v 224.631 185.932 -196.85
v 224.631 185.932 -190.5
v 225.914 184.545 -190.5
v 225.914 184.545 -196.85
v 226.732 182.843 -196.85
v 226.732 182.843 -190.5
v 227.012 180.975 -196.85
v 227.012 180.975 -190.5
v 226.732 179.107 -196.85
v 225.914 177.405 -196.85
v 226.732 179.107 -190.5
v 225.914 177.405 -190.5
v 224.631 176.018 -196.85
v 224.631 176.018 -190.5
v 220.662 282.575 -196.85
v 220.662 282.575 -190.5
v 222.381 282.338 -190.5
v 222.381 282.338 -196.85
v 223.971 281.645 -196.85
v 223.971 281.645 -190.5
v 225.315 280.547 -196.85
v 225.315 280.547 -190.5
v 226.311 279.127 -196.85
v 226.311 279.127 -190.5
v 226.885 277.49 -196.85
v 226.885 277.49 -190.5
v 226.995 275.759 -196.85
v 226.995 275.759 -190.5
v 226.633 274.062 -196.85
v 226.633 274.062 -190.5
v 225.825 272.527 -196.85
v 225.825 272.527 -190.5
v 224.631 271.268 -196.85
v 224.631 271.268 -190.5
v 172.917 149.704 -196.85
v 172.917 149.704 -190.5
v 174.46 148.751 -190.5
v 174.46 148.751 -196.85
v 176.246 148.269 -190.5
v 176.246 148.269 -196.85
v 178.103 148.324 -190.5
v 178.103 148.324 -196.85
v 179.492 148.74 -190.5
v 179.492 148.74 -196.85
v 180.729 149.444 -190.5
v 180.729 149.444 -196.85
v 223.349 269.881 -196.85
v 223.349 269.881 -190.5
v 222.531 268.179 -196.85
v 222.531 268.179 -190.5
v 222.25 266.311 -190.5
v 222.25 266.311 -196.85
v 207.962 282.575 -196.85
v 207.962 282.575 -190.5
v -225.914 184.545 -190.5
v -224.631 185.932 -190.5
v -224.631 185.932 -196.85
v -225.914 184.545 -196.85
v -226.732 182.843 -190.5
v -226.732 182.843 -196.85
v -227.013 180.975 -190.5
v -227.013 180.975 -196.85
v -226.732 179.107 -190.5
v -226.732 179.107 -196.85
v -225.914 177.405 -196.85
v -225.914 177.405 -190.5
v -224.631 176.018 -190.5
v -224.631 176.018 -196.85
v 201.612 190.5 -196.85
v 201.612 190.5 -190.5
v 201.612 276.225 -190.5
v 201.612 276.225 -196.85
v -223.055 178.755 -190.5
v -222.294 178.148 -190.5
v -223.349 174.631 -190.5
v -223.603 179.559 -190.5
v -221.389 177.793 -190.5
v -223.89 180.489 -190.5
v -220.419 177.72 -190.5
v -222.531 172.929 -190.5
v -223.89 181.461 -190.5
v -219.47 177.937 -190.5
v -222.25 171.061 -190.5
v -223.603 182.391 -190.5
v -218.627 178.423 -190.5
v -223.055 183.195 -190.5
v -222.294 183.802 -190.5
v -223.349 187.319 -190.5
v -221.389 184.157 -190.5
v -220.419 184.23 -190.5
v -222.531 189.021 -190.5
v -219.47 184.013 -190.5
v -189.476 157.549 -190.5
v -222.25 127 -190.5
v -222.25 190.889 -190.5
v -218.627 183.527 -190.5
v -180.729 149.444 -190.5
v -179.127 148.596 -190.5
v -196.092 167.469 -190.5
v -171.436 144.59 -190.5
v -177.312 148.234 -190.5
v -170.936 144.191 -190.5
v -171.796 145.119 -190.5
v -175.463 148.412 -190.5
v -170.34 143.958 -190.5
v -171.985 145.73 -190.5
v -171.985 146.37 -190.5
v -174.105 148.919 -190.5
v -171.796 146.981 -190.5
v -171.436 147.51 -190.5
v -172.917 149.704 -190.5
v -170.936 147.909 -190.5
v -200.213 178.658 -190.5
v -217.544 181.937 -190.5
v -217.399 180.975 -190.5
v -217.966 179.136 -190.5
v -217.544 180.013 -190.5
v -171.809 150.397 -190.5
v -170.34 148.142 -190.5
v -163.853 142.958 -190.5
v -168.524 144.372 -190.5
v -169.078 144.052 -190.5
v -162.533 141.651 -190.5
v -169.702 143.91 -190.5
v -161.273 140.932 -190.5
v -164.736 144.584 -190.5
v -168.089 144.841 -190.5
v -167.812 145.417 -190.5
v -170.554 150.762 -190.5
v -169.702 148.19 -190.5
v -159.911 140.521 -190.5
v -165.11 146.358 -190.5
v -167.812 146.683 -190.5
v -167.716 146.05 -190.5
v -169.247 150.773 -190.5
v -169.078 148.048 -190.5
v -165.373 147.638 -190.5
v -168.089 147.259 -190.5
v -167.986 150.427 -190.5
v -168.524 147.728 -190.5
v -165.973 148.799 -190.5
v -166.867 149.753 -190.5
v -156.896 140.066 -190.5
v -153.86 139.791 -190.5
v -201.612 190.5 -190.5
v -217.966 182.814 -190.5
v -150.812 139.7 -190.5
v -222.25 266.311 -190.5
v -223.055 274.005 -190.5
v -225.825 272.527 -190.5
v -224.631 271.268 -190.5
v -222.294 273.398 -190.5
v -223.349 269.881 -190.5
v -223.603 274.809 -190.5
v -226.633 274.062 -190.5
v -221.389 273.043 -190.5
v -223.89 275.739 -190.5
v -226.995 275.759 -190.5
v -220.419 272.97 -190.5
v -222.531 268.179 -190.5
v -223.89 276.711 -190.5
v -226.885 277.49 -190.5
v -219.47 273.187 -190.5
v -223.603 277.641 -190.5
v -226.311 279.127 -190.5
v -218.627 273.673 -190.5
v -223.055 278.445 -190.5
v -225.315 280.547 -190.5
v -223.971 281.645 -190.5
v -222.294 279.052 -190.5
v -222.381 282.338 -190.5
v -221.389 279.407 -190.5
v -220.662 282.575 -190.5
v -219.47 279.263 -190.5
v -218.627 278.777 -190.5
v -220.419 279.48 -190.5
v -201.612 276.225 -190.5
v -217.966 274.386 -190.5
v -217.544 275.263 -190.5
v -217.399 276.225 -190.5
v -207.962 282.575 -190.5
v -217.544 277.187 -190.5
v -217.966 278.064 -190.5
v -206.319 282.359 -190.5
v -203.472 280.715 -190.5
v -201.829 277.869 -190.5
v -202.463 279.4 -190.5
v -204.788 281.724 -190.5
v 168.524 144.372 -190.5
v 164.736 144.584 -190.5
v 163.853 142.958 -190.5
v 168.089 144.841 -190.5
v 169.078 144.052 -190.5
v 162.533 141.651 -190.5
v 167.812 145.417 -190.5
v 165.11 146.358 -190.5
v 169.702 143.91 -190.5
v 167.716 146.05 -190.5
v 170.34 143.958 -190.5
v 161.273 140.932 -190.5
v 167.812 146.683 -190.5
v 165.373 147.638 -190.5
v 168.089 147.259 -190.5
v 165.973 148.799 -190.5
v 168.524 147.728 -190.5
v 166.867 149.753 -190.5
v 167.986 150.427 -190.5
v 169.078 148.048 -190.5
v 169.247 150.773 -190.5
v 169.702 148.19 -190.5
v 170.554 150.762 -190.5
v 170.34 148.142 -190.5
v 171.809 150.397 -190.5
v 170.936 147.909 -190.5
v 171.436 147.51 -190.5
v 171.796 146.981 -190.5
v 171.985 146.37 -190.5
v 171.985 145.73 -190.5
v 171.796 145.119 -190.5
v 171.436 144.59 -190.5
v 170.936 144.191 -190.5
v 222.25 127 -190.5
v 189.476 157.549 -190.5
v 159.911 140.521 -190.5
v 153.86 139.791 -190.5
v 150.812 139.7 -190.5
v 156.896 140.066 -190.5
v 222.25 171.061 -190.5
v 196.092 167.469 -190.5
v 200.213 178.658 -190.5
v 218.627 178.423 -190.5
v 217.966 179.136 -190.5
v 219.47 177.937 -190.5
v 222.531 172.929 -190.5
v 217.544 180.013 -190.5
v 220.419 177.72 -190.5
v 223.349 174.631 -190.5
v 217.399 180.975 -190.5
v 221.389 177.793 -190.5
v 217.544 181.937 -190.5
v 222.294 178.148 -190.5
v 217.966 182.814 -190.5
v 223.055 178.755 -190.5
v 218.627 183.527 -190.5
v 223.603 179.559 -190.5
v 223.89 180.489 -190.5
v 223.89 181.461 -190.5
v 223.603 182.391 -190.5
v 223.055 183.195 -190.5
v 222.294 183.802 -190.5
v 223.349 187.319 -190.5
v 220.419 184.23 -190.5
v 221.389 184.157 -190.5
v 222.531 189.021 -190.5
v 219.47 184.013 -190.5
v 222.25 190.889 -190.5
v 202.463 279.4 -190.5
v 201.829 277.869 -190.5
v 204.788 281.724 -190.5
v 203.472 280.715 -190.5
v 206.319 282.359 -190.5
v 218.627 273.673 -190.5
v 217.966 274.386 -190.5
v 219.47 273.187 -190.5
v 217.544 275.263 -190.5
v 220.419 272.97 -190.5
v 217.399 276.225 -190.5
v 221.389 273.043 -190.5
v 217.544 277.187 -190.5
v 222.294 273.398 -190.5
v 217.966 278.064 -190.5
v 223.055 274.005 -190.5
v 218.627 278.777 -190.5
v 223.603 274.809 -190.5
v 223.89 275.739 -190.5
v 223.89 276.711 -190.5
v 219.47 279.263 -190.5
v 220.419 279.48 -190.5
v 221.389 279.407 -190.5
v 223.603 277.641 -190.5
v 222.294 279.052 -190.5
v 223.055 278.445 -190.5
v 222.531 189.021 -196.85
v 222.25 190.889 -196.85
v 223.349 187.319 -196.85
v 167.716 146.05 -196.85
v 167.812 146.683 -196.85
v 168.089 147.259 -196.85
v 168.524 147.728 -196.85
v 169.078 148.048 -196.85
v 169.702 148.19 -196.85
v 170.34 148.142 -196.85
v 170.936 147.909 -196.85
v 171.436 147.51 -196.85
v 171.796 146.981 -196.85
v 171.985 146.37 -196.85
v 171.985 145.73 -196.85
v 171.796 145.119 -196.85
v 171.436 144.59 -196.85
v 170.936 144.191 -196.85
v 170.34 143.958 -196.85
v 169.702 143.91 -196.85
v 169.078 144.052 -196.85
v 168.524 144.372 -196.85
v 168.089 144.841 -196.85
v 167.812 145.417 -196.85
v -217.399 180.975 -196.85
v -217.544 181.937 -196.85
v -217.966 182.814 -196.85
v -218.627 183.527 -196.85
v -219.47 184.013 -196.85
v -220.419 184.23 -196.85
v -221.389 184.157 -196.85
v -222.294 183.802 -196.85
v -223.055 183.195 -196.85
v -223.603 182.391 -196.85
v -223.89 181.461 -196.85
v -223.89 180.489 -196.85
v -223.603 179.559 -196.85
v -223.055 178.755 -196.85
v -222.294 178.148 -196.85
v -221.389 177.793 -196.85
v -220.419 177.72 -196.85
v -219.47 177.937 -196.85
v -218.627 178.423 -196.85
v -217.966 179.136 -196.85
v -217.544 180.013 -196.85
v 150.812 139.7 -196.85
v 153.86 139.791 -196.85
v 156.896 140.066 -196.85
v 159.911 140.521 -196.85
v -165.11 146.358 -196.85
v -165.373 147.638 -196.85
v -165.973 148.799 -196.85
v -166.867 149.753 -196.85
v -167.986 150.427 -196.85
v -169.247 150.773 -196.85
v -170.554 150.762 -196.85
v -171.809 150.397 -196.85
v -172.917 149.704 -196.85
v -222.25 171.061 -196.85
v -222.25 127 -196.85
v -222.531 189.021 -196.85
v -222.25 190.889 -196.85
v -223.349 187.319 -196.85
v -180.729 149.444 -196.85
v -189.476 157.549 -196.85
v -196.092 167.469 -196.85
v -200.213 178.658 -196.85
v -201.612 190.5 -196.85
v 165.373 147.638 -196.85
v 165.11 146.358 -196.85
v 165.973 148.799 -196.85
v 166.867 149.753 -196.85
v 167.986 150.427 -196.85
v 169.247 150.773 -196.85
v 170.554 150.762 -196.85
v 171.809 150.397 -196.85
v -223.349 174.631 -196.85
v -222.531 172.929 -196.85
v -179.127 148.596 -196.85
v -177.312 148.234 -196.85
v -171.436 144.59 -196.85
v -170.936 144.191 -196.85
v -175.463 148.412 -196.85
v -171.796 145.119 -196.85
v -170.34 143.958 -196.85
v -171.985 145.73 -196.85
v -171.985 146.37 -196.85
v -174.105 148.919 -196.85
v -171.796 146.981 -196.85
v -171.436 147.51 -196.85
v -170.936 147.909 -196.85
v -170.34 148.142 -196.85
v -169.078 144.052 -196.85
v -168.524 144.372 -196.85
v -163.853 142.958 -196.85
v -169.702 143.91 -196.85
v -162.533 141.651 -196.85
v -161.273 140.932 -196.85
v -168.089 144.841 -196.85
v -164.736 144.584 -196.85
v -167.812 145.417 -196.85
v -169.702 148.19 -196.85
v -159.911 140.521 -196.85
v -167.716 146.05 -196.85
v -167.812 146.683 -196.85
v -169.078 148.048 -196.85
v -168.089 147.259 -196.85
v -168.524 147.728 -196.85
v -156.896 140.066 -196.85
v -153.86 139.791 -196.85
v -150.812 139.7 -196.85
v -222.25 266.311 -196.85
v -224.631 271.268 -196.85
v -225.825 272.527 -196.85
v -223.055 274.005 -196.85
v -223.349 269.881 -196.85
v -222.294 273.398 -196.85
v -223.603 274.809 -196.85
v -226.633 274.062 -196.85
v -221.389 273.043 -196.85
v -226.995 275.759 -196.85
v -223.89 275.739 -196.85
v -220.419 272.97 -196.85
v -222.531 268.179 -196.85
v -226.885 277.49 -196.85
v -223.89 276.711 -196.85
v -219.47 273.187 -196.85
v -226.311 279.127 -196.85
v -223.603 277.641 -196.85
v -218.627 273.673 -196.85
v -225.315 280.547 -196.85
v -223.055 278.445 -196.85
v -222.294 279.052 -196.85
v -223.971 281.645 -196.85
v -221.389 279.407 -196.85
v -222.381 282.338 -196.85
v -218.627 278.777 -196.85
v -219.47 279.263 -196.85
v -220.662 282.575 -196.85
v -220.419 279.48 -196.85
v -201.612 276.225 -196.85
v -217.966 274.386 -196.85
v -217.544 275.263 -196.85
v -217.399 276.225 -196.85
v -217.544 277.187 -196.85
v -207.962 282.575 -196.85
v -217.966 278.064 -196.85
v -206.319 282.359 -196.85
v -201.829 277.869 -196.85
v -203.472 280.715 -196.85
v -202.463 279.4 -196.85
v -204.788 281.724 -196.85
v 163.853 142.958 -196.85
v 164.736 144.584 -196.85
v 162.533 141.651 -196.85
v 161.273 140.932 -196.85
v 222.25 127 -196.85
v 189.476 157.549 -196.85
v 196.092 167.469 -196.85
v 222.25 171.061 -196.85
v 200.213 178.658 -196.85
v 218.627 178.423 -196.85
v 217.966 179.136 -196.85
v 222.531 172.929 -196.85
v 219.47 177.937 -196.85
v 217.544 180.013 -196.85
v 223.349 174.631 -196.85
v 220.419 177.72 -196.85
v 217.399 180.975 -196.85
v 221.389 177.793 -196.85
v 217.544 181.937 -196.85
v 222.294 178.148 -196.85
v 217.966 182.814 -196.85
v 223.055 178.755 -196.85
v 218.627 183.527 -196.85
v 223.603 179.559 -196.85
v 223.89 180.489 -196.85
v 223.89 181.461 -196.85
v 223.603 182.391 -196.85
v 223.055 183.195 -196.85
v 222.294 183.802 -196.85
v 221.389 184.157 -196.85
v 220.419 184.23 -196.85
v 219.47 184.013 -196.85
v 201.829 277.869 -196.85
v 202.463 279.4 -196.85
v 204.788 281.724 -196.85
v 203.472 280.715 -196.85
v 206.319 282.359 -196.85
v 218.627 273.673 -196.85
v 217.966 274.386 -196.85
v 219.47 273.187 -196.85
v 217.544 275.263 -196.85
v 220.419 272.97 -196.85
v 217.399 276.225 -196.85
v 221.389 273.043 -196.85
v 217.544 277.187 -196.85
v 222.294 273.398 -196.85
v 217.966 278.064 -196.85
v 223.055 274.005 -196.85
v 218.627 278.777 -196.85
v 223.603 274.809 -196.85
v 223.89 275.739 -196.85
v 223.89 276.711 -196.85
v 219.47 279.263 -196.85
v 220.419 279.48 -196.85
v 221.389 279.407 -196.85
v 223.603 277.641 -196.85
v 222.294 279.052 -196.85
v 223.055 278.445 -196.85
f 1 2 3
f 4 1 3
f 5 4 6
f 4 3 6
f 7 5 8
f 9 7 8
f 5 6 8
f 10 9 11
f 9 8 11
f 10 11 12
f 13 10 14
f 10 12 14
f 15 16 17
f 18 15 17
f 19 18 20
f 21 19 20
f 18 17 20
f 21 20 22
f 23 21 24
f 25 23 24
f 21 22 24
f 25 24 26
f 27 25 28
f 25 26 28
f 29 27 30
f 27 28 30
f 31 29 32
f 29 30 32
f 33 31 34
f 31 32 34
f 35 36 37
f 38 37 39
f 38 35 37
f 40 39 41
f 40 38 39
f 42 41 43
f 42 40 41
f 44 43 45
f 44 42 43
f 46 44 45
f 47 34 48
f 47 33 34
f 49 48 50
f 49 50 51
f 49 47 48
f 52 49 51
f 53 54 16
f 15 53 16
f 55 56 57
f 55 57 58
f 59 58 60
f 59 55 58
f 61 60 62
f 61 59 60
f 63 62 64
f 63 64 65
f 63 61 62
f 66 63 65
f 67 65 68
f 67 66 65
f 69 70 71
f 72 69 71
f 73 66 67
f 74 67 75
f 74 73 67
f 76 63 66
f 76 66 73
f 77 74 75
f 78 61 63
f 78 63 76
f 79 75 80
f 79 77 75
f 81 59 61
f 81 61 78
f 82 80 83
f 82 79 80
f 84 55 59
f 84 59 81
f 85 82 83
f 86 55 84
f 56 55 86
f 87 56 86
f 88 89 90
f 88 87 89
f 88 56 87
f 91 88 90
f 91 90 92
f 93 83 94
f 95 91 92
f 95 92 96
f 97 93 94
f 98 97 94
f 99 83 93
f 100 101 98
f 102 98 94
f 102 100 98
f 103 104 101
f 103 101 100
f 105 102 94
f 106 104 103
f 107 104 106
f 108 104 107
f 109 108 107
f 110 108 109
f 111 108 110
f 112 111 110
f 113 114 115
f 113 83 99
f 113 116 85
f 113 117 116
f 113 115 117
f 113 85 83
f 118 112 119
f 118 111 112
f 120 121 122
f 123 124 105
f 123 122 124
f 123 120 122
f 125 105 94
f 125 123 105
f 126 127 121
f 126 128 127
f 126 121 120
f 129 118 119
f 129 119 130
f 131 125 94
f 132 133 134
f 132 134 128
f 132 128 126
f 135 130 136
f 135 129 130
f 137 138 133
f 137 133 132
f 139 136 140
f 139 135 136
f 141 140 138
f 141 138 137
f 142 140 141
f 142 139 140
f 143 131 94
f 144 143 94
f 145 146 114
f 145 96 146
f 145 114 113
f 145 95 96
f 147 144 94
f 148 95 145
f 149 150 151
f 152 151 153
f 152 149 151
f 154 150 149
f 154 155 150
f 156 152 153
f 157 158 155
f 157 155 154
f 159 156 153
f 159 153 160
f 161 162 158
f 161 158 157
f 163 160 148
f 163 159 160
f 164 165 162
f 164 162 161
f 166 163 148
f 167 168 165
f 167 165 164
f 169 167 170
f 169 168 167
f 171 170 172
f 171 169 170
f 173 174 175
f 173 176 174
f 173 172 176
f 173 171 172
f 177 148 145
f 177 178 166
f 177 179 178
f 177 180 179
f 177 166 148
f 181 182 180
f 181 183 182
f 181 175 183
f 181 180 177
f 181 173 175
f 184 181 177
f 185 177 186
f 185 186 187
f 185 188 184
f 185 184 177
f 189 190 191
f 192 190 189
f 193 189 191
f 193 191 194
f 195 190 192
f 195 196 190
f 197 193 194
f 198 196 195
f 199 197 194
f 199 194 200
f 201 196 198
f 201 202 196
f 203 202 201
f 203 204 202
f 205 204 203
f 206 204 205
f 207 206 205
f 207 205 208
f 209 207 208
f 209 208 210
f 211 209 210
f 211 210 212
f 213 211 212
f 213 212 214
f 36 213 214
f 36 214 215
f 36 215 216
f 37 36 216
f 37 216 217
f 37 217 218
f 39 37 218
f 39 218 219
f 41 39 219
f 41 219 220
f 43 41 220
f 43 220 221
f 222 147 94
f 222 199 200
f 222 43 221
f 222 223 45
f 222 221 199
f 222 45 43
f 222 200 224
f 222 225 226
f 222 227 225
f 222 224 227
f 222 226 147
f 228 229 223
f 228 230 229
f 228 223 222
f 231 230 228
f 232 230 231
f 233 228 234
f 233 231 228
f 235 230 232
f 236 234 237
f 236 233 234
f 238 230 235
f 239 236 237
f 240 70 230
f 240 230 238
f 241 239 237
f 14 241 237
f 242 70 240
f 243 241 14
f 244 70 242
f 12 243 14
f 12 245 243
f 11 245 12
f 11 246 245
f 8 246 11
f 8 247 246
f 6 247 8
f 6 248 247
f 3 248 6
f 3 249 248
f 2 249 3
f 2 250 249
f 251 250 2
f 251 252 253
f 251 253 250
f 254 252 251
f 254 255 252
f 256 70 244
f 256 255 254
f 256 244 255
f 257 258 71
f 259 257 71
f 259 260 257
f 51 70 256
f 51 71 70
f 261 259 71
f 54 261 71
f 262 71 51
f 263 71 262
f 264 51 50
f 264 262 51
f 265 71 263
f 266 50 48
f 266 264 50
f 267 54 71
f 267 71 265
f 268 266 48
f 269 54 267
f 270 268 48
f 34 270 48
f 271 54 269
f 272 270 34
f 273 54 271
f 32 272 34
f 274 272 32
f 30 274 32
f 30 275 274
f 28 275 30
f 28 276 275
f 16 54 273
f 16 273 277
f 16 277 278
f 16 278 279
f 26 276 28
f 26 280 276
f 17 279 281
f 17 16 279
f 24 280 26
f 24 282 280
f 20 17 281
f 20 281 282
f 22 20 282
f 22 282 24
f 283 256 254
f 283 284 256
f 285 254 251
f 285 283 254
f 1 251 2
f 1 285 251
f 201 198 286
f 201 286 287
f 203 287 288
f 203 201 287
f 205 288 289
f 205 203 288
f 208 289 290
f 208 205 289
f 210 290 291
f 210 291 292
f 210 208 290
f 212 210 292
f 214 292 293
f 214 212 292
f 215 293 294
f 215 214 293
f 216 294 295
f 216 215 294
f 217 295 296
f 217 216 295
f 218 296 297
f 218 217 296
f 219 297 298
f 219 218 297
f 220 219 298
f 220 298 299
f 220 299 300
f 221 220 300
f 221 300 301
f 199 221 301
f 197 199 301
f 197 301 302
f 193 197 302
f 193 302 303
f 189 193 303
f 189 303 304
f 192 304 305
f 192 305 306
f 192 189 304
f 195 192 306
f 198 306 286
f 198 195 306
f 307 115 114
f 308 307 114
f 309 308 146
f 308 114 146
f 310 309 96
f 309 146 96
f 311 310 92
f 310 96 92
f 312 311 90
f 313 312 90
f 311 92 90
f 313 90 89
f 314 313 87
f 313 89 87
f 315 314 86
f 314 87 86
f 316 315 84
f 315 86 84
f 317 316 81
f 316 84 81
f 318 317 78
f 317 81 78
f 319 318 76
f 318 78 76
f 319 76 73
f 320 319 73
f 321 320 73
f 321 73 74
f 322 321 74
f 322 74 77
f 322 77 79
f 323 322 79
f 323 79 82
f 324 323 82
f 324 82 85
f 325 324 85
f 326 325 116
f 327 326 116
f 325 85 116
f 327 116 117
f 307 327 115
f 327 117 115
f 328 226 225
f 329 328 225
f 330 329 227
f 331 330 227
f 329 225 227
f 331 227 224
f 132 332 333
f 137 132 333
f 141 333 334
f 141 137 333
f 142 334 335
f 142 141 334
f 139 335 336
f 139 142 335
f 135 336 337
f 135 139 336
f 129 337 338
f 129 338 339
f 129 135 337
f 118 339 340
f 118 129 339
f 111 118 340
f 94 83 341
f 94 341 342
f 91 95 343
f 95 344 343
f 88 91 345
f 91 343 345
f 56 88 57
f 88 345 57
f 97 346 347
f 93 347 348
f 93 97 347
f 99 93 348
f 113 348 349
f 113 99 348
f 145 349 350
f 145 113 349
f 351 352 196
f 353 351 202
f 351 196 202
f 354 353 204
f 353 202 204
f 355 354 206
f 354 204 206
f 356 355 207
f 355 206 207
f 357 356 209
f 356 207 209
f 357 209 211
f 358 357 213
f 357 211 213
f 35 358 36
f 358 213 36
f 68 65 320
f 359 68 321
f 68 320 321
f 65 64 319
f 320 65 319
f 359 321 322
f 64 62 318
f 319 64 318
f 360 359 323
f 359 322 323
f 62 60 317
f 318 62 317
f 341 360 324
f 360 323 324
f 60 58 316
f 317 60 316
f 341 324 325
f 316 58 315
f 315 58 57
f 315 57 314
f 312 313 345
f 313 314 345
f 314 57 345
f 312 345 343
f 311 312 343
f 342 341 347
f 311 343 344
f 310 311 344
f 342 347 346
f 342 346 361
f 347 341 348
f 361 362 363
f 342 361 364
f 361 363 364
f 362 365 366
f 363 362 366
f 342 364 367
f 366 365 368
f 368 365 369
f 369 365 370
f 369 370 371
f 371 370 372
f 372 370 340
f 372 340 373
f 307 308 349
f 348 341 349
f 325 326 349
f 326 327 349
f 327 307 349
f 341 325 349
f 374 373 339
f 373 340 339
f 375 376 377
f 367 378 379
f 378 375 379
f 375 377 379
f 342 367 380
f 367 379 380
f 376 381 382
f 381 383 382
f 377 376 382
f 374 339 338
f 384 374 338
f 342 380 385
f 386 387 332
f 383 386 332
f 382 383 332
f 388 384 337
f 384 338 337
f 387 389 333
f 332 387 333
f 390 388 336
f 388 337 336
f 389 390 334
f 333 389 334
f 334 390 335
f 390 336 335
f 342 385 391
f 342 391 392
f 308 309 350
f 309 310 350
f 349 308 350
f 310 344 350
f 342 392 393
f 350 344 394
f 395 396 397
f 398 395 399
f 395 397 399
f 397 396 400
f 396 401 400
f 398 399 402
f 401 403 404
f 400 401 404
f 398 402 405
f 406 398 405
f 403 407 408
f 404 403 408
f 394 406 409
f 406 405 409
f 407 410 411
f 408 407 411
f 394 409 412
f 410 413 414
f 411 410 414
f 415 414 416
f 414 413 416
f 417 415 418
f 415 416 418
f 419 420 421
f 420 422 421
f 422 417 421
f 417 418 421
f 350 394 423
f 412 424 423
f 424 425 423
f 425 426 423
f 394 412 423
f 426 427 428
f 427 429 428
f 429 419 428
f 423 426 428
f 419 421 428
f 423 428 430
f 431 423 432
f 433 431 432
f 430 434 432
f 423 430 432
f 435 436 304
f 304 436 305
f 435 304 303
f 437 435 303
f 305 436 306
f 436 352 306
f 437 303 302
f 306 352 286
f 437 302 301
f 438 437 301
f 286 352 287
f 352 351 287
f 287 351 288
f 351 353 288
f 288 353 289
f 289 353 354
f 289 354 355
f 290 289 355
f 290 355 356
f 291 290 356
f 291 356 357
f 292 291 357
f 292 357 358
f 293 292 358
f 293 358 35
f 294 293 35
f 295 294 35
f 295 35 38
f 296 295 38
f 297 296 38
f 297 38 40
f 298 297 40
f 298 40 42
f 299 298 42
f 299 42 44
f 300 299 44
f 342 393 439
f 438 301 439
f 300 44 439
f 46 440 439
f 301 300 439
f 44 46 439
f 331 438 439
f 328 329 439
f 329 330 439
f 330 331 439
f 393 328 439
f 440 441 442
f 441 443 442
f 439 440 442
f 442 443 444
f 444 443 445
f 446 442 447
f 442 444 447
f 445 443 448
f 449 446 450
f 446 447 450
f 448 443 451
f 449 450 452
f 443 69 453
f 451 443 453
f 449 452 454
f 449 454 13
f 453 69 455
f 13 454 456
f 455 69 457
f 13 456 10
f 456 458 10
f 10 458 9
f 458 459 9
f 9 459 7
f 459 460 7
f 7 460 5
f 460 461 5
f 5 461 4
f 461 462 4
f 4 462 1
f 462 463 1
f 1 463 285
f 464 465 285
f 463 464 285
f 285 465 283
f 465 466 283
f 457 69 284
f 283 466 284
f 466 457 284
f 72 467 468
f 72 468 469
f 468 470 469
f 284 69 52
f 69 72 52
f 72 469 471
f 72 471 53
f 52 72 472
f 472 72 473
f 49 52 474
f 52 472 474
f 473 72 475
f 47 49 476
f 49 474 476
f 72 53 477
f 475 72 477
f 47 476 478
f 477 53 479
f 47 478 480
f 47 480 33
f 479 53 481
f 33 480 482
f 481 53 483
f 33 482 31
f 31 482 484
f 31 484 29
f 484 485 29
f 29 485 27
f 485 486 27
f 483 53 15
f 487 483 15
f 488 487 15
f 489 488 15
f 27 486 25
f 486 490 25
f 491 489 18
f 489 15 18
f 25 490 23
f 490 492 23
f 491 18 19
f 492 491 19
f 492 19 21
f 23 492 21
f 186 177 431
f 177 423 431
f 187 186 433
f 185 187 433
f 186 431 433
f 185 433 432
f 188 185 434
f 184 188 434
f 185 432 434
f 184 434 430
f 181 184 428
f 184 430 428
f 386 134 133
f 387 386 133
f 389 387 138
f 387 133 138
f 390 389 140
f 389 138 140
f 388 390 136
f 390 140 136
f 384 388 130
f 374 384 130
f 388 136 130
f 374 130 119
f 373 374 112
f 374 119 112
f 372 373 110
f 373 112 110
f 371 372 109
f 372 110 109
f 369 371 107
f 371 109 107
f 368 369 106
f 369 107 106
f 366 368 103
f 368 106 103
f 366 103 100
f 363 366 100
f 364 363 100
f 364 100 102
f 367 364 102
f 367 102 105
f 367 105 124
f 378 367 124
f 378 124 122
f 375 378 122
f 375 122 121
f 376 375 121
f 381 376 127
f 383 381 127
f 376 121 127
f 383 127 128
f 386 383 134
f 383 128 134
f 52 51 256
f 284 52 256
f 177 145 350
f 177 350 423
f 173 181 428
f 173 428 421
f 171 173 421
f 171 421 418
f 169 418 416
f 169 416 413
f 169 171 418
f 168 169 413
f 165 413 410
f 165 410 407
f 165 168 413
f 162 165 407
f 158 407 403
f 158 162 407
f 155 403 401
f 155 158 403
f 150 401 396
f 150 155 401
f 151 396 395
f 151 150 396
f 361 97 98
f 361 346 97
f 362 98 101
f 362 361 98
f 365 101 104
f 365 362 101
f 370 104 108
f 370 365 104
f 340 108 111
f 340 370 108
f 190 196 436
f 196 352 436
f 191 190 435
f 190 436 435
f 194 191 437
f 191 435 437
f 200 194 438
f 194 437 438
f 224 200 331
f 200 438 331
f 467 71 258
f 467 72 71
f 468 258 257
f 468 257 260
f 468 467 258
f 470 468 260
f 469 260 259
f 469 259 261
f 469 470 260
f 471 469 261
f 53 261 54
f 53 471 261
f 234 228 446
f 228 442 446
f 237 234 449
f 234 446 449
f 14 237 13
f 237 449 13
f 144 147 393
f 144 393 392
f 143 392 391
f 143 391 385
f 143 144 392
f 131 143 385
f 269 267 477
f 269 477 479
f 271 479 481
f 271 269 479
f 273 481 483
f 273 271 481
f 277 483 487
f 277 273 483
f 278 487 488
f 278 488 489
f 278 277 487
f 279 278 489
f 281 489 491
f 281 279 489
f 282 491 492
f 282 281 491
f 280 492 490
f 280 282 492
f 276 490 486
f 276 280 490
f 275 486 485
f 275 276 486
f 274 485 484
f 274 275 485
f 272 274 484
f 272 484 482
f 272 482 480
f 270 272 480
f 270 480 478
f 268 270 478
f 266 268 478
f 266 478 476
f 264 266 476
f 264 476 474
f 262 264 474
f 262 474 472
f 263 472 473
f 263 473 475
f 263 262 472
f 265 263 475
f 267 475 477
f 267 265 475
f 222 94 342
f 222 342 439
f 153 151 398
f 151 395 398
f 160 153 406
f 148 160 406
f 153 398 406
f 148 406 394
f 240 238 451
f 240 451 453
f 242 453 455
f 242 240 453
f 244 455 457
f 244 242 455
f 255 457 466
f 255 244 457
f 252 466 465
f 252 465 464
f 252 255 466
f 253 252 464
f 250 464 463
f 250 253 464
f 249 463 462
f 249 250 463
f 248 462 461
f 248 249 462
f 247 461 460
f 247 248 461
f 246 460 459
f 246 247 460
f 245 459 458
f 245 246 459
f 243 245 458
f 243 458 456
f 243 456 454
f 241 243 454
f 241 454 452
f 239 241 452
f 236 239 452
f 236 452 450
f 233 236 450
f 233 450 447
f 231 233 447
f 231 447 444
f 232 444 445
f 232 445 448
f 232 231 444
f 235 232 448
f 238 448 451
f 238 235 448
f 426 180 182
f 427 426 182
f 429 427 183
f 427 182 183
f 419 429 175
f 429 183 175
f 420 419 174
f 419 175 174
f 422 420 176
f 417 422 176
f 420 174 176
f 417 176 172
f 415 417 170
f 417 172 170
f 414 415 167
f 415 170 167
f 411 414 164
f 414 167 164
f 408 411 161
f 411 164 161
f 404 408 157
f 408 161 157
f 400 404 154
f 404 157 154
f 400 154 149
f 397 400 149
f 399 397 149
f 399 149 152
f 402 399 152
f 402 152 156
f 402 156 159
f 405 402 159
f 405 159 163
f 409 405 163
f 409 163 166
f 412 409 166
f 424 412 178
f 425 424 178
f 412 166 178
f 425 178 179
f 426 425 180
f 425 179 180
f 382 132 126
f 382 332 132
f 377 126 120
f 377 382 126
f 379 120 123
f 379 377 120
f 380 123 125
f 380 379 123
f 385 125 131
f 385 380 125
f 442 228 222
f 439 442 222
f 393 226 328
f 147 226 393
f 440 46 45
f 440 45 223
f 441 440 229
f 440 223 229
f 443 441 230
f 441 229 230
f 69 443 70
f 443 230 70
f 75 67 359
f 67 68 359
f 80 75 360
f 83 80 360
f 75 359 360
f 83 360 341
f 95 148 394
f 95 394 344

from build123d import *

# Parameters (mm, degrees)
SKETCH1_R            = 6.35
SKETCH1_R_2          = 3.2639
SKETCH1_R_3          = 2.1463
BOSS_EXTRUDE1_DEPTH  = 6.35
FILLET1_R            = 6.35
FILLET2_R            = 6.35
FILLET1_OF_MIRROR1_R = 6.35
FILLET2_OF_MIRROR1_R = 6.35


with BuildPart() as part:
    # Sketch1 → Boss-Extrude1 (new body)
    # profile 1 of 5: a face of its own
    with BuildSketch(Plane(origin=(0, 0, -190.5), x_dir=(-1, 0, 0), z_dir=(0, 0, -1))):
        with BuildLine():
            Line((-222.25, 270.076638938), (-222.25, 187.123361062))
            ThreePointArc((-222.25, 187.123361062), (-216.773935033, 185.995115786), (-214.3125, 180.975))
            ThreePointArc((-214.3125, 180.975), (-216.773935033, 175.954884214), (-222.25, 174.826638938))
            Line((-222.25, 174.826638938), (-222.25, 127))
            Line((-222.25, 127), (0, 127))
            Line((0, 127), (0, 139.7))
            Line((0, 139.7), (-150.8125, 139.7))
            ThreePointArc((-150.8125, 139.7), (-158.964771181, 140.358395772), (-166.90572658, 142.316516748))
            ThreePointArc((-166.90572658, 142.316516748), (-171.738540659, 141.672571795), (-174.60521092, 145.616295752))
            ThreePointArc((-174.60521092, 145.616295752), (-194.340133262, 164.308681923), (-201.6125, 190.5))
            Line((-201.6125, 190.5), (-201.6125, 282.575))
            Line((-201.6125, 282.575), (-220.6625, 282.575))
            ThreePointArc((-220.6625, 282.575), (-216.172371939, 280.715128061), (-214.3125, 276.225))
            ThreePointArc((-214.3125, 276.225), (-216.773935033, 271.204884214), (-222.25, 270.076638938))
        make_face()
    # profile 2 of 5: a face of its own
    with BuildSketch(Plane(origin=(0, 0, -190.5), x_dir=(-1, 0, 0), z_dir=(0, 0, -1))):
        with Locations((-220.6625, 276.225)):
            Circle(SKETCH1_R)
        with Locations((-220.6625, 276.225)):
            Circle(SKETCH1_R_2, mode=Mode.SUBTRACT)
    # profile 3 of 5: a face of its own
    with BuildSketch(Plane(origin=(0, 0, -190.5), x_dir=(-1, 0, 0), z_dir=(0, 0, -1))):
        with Locations((-220.6625, 180.975)):
            Circle(SKETCH1_R)
        with Locations((-220.6625, 180.975)):
            Circle(SKETCH1_R_2, mode=Mode.SUBTRACT)
    # profile 4 of 5: a face of its own
    with BuildSketch(Plane(origin=(0, 0, -190.5), x_dir=(-1, 0, 0), z_dir=(0, 0, -1))):
        with BuildLine():
            ThreePointArc((-165.1, 146.05), (-170.079577741, 150.807550158), (-174.60521092, 145.616295752))
            ThreePointArc((-174.60521092, 145.616295752), (-170.823600368, 143.807432475), (-166.90572658, 142.316516748))
            ThreePointArc((-166.90572658, 142.316516748), (-165.575132529, 143.976383252), (-165.1, 146.05))
        make_face()
        with Locations((-169.8625, 146.05)):
            Circle(SKETCH1_R_3, mode=Mode.SUBTRACT)
    # profile 5 of 5: a face of its own
    with BuildSketch(Plane(origin=(0, 0, -190.5), x_dir=(-1, 0, 0), z_dir=(0, 0, -1))):
        with BuildLine():
            ThreePointArc((-166.90572658, 142.316516748), (-170.823600368, 143.807432475), (-174.60521092, 145.616295752))
            ThreePointArc((-174.60521092, 145.616295752), (-171.738540659, 141.672571795), (-166.90572658, 142.316516748))
        make_face()
    boss_extrude1 = extrude(amount=BOSS_EXTRUDE1_DEPTH)

    # Fillet1
    fillet1_edges = [part.edges().sort_by_distance(p)[0] for p in [
        (174.60521092, 145.616295752, -193.675),
        (166.90572658, 142.316516748, -193.675),
    ]]
    fillet(fillet1_edges, radius=FILLET1_R)

    # Fillet2
    fillet2_edges = [part.edges().sort_by_distance(p)[0] for p in [
        (222.25, 174.826638938, -193.675),
        (222.25, 187.123361062, -193.675),
        (222.25, 270.076638938, -193.675),
        (201.6125, 282.575, -193.675),
    ]]
    fillet(fillet2_edges, radius=FILLET2_R)

    # Mirror1: Boss-Extrude1 across plane
    add(boss_extrude1.mirror(Plane(origin=(0, 0, 0), x_dir=(0, 0, 1), z_dir=(1, 0, 0))))

    # Fillet1 of Mirror1
    fillet1_of_mirror1_edges = [part.edges().sort_by_distance(p)[0] for p in [
        (-174.60521092, 145.616295752, -193.675),
        (-166.90572658, 142.316516748, -193.675),
    ]]
    fillet(fillet1_of_mirror1_edges, radius=FILLET1_OF_MIRROR1_R)

    # Fillet2 of Mirror1
    fillet2_of_mirror1_edges = [part.edges().sort_by_distance(p)[0] for p in [
        (-222.25, 174.826638938, -193.675),
        (-222.25, 187.123361062, -193.675),
        (-222.25, 270.076638938, -193.675),
        (-201.6125, 282.575, -193.675),
    ]]
    fillet(fillet2_of_mirror1_edges, radius=FILLET2_OF_MIRROR1_R)


solid = part.part
